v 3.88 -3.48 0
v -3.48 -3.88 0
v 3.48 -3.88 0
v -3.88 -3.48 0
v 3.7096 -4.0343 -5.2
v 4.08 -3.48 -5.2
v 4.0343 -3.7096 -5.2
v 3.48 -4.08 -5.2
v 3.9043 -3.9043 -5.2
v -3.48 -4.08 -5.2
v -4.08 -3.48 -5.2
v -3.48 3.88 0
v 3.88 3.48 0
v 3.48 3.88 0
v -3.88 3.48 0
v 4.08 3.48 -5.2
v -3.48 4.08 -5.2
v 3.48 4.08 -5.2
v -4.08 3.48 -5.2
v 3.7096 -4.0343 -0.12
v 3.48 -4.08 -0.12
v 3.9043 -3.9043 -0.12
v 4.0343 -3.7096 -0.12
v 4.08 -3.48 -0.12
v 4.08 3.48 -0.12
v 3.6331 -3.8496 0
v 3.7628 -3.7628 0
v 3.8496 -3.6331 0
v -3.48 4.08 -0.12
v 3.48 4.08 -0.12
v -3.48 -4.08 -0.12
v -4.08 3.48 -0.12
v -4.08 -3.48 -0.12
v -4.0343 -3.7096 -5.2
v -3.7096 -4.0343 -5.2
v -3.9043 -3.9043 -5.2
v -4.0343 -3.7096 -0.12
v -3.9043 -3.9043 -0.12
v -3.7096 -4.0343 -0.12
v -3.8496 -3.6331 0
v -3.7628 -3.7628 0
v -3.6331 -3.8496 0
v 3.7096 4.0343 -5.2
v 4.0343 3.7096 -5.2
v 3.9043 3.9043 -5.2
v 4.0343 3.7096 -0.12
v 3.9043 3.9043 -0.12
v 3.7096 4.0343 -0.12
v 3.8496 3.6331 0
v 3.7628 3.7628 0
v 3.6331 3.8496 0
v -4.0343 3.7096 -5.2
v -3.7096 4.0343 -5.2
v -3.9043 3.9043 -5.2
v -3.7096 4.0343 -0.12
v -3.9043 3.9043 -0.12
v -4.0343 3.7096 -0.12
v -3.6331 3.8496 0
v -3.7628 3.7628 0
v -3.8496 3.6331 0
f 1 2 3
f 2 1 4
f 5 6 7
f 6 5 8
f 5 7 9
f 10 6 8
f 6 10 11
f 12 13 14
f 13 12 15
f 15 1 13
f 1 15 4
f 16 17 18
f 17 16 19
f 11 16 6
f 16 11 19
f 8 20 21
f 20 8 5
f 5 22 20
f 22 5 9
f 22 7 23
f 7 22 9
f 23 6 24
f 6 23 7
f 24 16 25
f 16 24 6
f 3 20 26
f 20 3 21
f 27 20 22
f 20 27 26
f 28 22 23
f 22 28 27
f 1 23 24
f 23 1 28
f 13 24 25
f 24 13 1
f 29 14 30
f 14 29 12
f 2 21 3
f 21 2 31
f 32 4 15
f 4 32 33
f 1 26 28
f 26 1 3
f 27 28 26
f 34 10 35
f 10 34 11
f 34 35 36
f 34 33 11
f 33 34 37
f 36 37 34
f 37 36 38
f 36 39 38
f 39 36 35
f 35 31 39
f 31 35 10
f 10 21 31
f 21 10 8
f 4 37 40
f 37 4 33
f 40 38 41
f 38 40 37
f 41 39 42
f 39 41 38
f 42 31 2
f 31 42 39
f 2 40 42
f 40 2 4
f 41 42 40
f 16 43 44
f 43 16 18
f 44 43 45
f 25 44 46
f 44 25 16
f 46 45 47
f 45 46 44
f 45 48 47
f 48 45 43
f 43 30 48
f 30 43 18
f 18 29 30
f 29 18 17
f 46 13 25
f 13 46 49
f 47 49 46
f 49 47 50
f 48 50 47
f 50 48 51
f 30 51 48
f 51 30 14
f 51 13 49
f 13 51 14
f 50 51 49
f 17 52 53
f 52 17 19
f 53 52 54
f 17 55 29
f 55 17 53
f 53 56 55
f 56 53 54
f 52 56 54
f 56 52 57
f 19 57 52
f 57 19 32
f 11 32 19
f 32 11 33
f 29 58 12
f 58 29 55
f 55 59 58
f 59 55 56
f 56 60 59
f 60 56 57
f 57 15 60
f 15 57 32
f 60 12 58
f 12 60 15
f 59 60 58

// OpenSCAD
// file: ../p/1-4cyli.scad
use <../lib.scad>
function ldraw_lib__1_4cyli() = [
// 0 Cylinder 0.25
// 0 Name: 1-4cyli.dat
// 0 Author: James Jessiman
// 0 !LDRAW_ORG Primitive UPDATE 2012-01
// 0 !LICENSE Licensed under CC BY 2.0 and CC BY 4.0 : see CAreadme.txt
// 
// 0 BFC CERTIFY CCW
  [0,"BFC","CERTIFY"],
  [0,"BFC","CCW"],
// 
// 0 !HISTORY 2002-03-23 [sbliss] Added BFC statement.
// 0 !HISTORY 2002-04-25 [PTadmin] Official Update 2002-02
// 0 !HISTORY 2007-06-22 [PTadmin] Header formatted for Contributor Agreement
// 0 !HISTORY 2008-07-01 [PTadmin] Official Update 2008-01
// 0 !HISTORY 2012-02-16 [Philo] Changed to CCW
// 0 !HISTORY 2012-03-30 [PTadmin] Official Update 2012-01
// 
// 
// 4 16 1 1 0 0.9239 1 0.3827 0.9239 0 0.3827 1 0 0
  [4,16,1,1,0,0.9239,1,0.3827,0.9239,0,0.3827,1,0,0],
// 5 24 1 0 0 1 1 0 0.9239 0 0.3827 1 0 -1
  [5,24,1,0,0,1,1,0,0.9239,0,0.3827,1,0,-1],
// 4 16 0.9239 1 0.3827 0.7071 1 0.7071 0.7071 0 0.7071 0.9239 0 0.3827
  [4,16,0.9239,1,0.3827,0.7071,1,0.7071,0.7071,0,0.7071,0.9239,0,0.3827],
// 5 24 0.9239 0 0.3827 0.9239 1 0.3827 0.7071 0 0.7071 1 0 0
  [5,24,0.9239,0,0.3827,0.9239,1,0.3827,0.7071,0,0.7071,1,0,0],
// 4 16 0.7071 1 0.7071 0.3827 1 0.9239 0.3827 0 0.9239 0.7071 0 0.7071
  [4,16,0.7071,1,0.7071,0.3827,1,0.9239,0.3827,0,0.9239,0.7071,0,0.7071],
// 5 24 0.7071 0 0.7071 0.7071 1 0.7071 0.3827 0 0.9239 0.9239 0 0.3827
  [5,24,0.7071,0,0.7071,0.7071,1,0.7071,0.3827,0,0.9239,0.9239,0,0.3827],
// 4 16 0.3827 1 0.9239 0 1 1 0 0 1 0.3827 0 0.9239
  [4,16,0.3827,1,0.9239,0,1,1,0,0,1,0.3827,0,0.9239],
// 5 24 0.3827 0 0.9239 0.3827 1 0.9239 0 0 1 0.7071 0 0.7071
  [5,24,0.3827,0,0.9239,0.3827,1,0.9239,0,0,1,0.7071,0,0.7071],
// 5 24 0 0 1 0 1 1 0.3827 0 0.9239 -1 0 1
  [5,24,0,0,1,0,1,1,0.3827,0,0.9239,-1,0,1],
];
module ldraw_lib__1_4cyli(step=0, col=false, unit=2/5, alt=false, line=0.2, solid=!$preview)
    makepoly(ldraw_lib__1_4cyli(), step=step, col=col, unit=unit, alt=alt, line=line, solid=solid);
ldraw_lib__1_4cyli(line=0.2);
// file: ../p/rect2p.scad
use <../lib.scad>
function ldraw_lib__rect2p() = [
// 0 Rectangle with 2 Parallel Edges
// 0 Name: rect2p.dat
// 0 Author: Donald Sutter [technog]
// 0 !LDRAW_ORG Primitive UPDATE 2010-01
// 0 !LICENSE Licensed under CC BY 2.0 and CC BY 4.0 : see CAreadme.txt
// 
// 0 BFC CERTIFY CCW
  [0,"BFC","CERTIFY"],
  [0,"BFC","CCW"],
// 
// 0 !HISTORY 2003-08-01 [PTadmin] Official Update 2003-02
// 0 !HISTORY 2007-06-24 [PTadmin] Header formatted for Contributor Agreement
// 0 !HISTORY 2008-07-01 [PTadmin] Official Update 2008-01
// 0 !HISTORY 2010-01-17 [mikeheide] changed winding to CCW
// 0 !HISTORY 2010-04-05 [PTadmin] Official Update 2010-01
// 
// 
// 2 24 1 0 1 -1 0 1
  [2,24,1,0,1,-1,0,1],
// 2 24 -1 0 -1 1 0 -1
  [2,24,-1,0,-1,1,0,-1],
// 4 16 -1 0 1 -1 0 -1 1 0 -1 1 0 1
  [4,16,-1,0,1,-1,0,-1,1,0,-1,1,0,1],
// 0
];
module ldraw_lib__rect2p(step=0, col=false, unit=2/5, alt=false, line=0.2, solid=!$preview)
    makepoly(ldraw_lib__rect2p(), step=step, col=col, unit=unit, alt=alt, line=line, solid=solid);
ldraw_lib__rect2p(line=0.2);
// file: ../p/rect1.scad
use <../lib.scad>
function ldraw_lib__rect1() = [
// 0 Rectangle with 1 Edge
// 0 Name: rect1.dat
// 0 Author: Chris Dee [cwdee]
// 0 !LDRAW_ORG Primitive UPDATE 2010-01
// 0 !LICENSE Licensed under CC BY 2.0 and CC BY 4.0 : see CAreadme.txt
// 
// 0 BFC CERTIFY CCW
  [0,"BFC","CERTIFY"],
  [0,"BFC","CCW"],
// 
// 0 !HISTORY 2003-12-19 [PTadmin] Official Update 2003-03
// 0 !HISTORY 2007-06-24 [PTadmin] Header formatted for Contributor Agreement
// 0 !HISTORY 2008-07-01 [PTadmin] Official Update 2008-01
// 0 !HISTORY 2010-01-17 [mikeheide] changed winding to CCW
// 0 !HISTORY 2010-04-05 [PTadmin] Official Update 2010-01
// 
// 
// 2 24 1 0 -1 1 0 1
  [2,24,1,0,-1,1,0,1],
// 4 16 -1 0 1 -1 0 -1 1 0 -1 1 0 1
  [4,16,-1,0,1,-1,0,-1,1,0,-1,1,0,1],
// 0
];
module ldraw_lib__rect1(step=0, col=false, unit=2/5, alt=false, line=0.2, solid=!$preview)
    makepoly(ldraw_lib__rect1(), step=step, col=col, unit=unit, alt=alt, line=line, solid=solid);
ldraw_lib__rect1(line=0.2);
// file: ../p/1-4edge.scad
use <../lib.scad>
function ldraw_lib__1_4edge() = [
// 0 Circle 0.25
// 0 Name: 1-4edge.dat
// 0 Author: James Jessiman
// 0 !LDRAW_ORG Primitive UPDATE 2017-01
// 0 !LICENSE Licensed under CC BY 2.0 and CC BY 4.0 : see CAreadme.txt
// 
// 0 BFC CERTIFY CCW
  [0,"BFC","CERTIFY"],
  [0,"BFC","CCW"],
// 
// 0 !HISTORY 2007-06-22 [PTadmin] Header formatted for Contributor Agreement
// 0 !HISTORY 2008-07-01 [PTadmin] Official Update 2008-01
// 0 !HISTORY 2017-01-15 [Steffen] BFCed
// 0 !HISTORY 2017-12-30 [PTadmin] Official Update 2017-01
// 
// 
// 2 24 1 0 0 0.9239 0 0.3827
  [2,24,1,0,0,0.9239,0,0.3827],
// 2 24 0.9239 0 0.3827 0.7071 0 0.7071
  [2,24,0.9239,0,0.3827,0.7071,0,0.7071],
// 2 24 0.7071 0 0.7071 0.3827 0 0.9239
  [2,24,0.7071,0,0.7071,0.3827,0,0.9239],
// 2 24 0.3827 0 0.9239 0 0 1
  [2,24,0.3827,0,0.9239,0,0,1],
];
module ldraw_lib__1_4edge(step=0, col=false, unit=2/5, alt=false, line=0.2, solid=!$preview)
    makepoly(ldraw_lib__1_4edge(), step=step, col=col, unit=unit, alt=alt, line=line, solid=solid);
ldraw_lib__1_4edge(line=0.2);
// file: ../p/1-4cylo.scad
use <../lib.scad>
use <1-4cyli.scad>
use <1-4edge.scad>
function ldraw_lib__1_4cylo() = [
// 0 Cylinder Open 0.25
// 0 Name: 1-4cylo.dat
// 0 Author: Max Martin Richter [MMR1988]
// 0 !LDRAW_ORG Primitive UPDATE 2010-03
// 0 !LICENSE Licensed under CC BY 2.0 and CC BY 4.0 : see CAreadme.txt
// 
// 0 BFC CERTIFY CCW
  [0,"BFC","CERTIFY"],
  [0,"BFC","CCW"],
// 
// 0 !HISTORY 2010-12-31 [PTadmin] Official Update 2010-03
// 
// 
// 1 16 0 0 0 1 0 0 0 1 0 0 0 1 1-4edge.dat
  [1,16,0,0,0,1,0,0,0,1,0,0,0,1, ldraw_lib__1_4edge()],
// 1 16 0 1 0 1 0 0 0 1 0 0 0 1 1-4edge.dat
  [1,16,0,1,0,1,0,0,0,1,0,0,0,1, ldraw_lib__1_4edge()],
// 1 16 0 0 0 1 0 0 0 1 0 0 0 1 1-4cyli.dat
  [1,16,0,0,0,1,0,0,0,1,0,0,0,1, ldraw_lib__1_4cyli()],
];
module ldraw_lib__1_4cylo(step=0, col=false, unit=2/5, alt=false, line=0.2, solid=!$preview)
    makepoly(ldraw_lib__1_4cylo(), step=step, col=col, unit=unit, alt=alt, line=line, solid=solid);
ldraw_lib__1_4cylo(line=0.2);
// file: ../p/1-4con2.scad
use <../lib.scad>
function ldraw_lib__1_4con2() = [
// 0 Cone  2 x 0.25
// 0 Name: 1-4con2.dat
// 0 Author: Steve Bliss [sbliss]
// 0 !LDRAW_ORG Primitive UPDATE 2012-01
// 0 !LICENSE Licensed under CC BY 2.0 and CC BY 4.0 : see CAreadme.txt
// 
// 0 BFC CERTIFY CCW
  [0,"BFC","CERTIFY"],
  [0,"BFC","CCW"],
// 
// 0 !HISTORY 1999-07-05 [PTadmin] Official Update 1999-05
// 0 !HISTORY 2002-12-11 [cwdee] Standardised title and made BFC compliant
// 0 !HISTORY 2003-06-28 [pneaster] Added missing conditional line
// 0 !HISTORY 2003-12-19 [PTadmin] Official Update 2003-03
// 0 !HISTORY 2007-06-22 [PTadmin] Header formatted for Contributor Agreement
// 0 !HISTORY 2008-07-01 [PTadmin] Official Update 2008-01
// 0 !HISTORY 2012-02-16 [Philo] Recreated CCW
// 0 !HISTORY 2012-03-30 [PTadmin] Official Update 2012-01
// 
// 
// 4 16 2 1 0 1.8478 1 0.7654 2.7717 0 1.1481 3 0 0
  [4,16,2,1,0,1.8478,1,0.7654,2.7717,0,1.1481,3,0,0],
// 4 16 1.8478 1 0.7654 1.4142 1 1.4142 2.1213 0 2.1213 2.7717 0 1.1481
  [4,16,1.8478,1,0.7654,1.4142,1,1.4142,2.1213,0,2.1213,2.7717,0,1.1481],
// 4 16 1.4142 1 1.4142 0.7654 1 1.8478 1.1481 0 2.7717 2.1213 0 2.1213
  [4,16,1.4142,1,1.4142,0.7654,1,1.8478,1.1481,0,2.7717,2.1213,0,2.1213],
// 4 16 0.7654 1 1.8478 0 1 2 0 0 3 1.1481 0 2.7717
  [4,16,0.7654,1,1.8478,0,1,2,0,0,3,1.1481,0,2.7717],
// 0 // conditional lines
// 5 24 2 1 0 3 0 0 2 1 -0.8284 1.8478 1 0.7654
  [5,24,2,1,0,3,0,0,2,1,-0.8284,1.8478,1,0.7654],
// 5 24 1.8478 1 0.7654 2.7717 0 1.1481 2 1 0 1.4142 1 1.4142
  [5,24,1.8478,1,0.7654,2.7717,0,1.1481,2,1,0,1.4142,1,1.4142],
// 5 24 1.4142 1 1.4142 2.1213 0 2.1213 1.8478 1 0.7654 0.7654 1 1.8478
  [5,24,1.4142,1,1.4142,2.1213,0,2.1213,1.8478,1,0.7654,0.7654,1,1.8478],
// 5 24 0.7654 1 1.8478 1.1481 0 2.7717 1.4142 1 1.4142 0 1 2
  [5,24,0.7654,1,1.8478,1.1481,0,2.7717,1.4142,1,1.4142,0,1,2],
// 5 24 0 1 2 0 0 3 0.7654 1 1.8478 -0.8284 1 2
  [5,24,0,1,2,0,0,3,0.7654,1,1.8478,-0.8284,1,2],
// 0 // Build by Primitive Generator 2
];
module ldraw_lib__1_4con2(step=0, col=false, unit=2/5, alt=false, line=0.2, solid=!$preview)
    makepoly(ldraw_lib__1_4con2(), step=step, col=col, unit=unit, alt=alt, line=line, solid=solid);
ldraw_lib__1_4con2(line=0.2);
// file: ../p/1-4chrd.scad
use <../lib.scad>
function ldraw_lib__1_4chrd() = [
// 0 Chord 0.25
// 0 Name: 1-4chrd.dat
// 0 Author: Tony Hafner [hafhead]
// 0 !LDRAW_ORG Primitive UPDATE 2012-02
// 0 !LICENSE Licensed under CC BY 2.0 and CC BY 4.0 : see CAreadme.txt
// 
// 0 BFC CERTIFY CCW
  [0,"BFC","CERTIFY"],
  [0,"BFC","CCW"],
// 
// 0 !HISTORY 2004-04-22 [PTadmin] Official Update 2004-02
// 0 !HISTORY 2007-10-09 [PTadmin] Header formatted for Contributor Agreement
// 0 !HISTORY 2008-07-01 [PTadmin] Official Update 2008-01
// 0 !HISTORY 2012-08-02 [MMR1988] Re-creation with PrimGen2 and Rectifier
// 0 !HISTORY 2012-08-09 [PTadmin] Official Update 2012-02
// 
// 
// 4 16 0.9239 0 0.3827 0.3827 0 0.9239 0 0 1 1 0 0
  [4,16,0.9239,0,0.3827,0.3827,0,0.9239,0,0,1,1,0,0],
// 3 16 0.7071 0 0.7071 0.3827 0 0.9239 0.9239 0 0.3827
  [3,16,0.7071,0,0.7071,0.3827,0,0.9239,0.9239,0,0.3827],
];
module ldraw_lib__1_4chrd(step=0, col=false, unit=2/5, alt=false, line=0.2, solid=!$preview)
    makepoly(ldraw_lib__1_4chrd(), step=step, col=col, unit=unit, alt=alt, line=line, solid=solid);
ldraw_lib__1_4chrd(line=0.2);
// main file
use <../lib.scad>
use <../p/1-4chrd.scad>
use <../p/1-4con2.scad>
use <../p/1-4cylo.scad>
use <../p/1-4edge.scad>
use <../p/rect1.scad>
use <../p/rect2p.scad>
function ldraw_lib__99146() = [
// 0 ~Electric Mindstorms EV3 Square Button
// 0 Name: 99146.dat
// 0 Author: Philippe Hurbain [Philo]
// 0 !LDRAW_ORG Part UPDATE 2013-02
// 0 !LICENSE Licensed under CC BY 2.0 and CC BY 4.0 : see CAreadme.txt
// 
// 0 BFC CERTIFY CCW
  [0,"BFC","CERTIFY"],
  [0,"BFC","CCW"],
// 
// 0 !HISTORY 2012-05-20 {LEGO MINDSTORMS Team} Original part shape
// 0 !HISTORY 2012-06-09 [Philo] Complete rebuild for LDraw Parts Tracker
// 0 !HISTORY 2013-12-23 [PTadmin] Official Update 2013-02
// 
// 
// 4 16 8.7 0 -9.7 9.7 0 -8.7 -9.7 0 -8.7 -8.7 0 -9.7
  [4,16,8.7,0,-9.7,9.7,0,-8.7,-9.7,0,-8.7,-8.7,0,-9.7],
// 1 16 8.7 13 -8.7 0 0 1.5 0 -0.3 0 -1.5 0 0 1-4chrd.dat
  [1,16,8.7,13,-8.7,0,0,1.5,0,-0.3,0,-1.5,0,0, ldraw_lib__1_4chrd()],
// 4 16 -8.7 13 -10.2 -10.2 13 -8.7 10.2 13 -8.7 8.7 13 -10.2
  [4,16,-8.7,13,-10.2,-10.2,13,-8.7,10.2,13,-8.7,8.7,13,-10.2],
// 4 16 -8.7 0 9.7 -9.7 0 8.7 9.7 0 8.7 8.7 0 9.7
  [4,16,-8.7,0,9.7,-9.7,0,8.7,9.7,0,8.7,8.7,0,9.7],
// 1 16 0 0 0 0 0 -9.7 0 1 0 8.7 0 0 rect2p.dat
  [1,16,0,0,0,0,0,-9.7,0,1,0,8.7,0,0, ldraw_lib__rect2p()],
// 4 16 8.7 13 10.2 10.2 13 8.7 -10.2 13 8.7 -8.7 13 10.2
  [4,16,8.7,13,10.2,10.2,13,8.7,-10.2,13,8.7,-8.7,13,10.2],
// 4 16 -10.2 13 -8.7 -10.2 13 8.7 10.2 13 8.7 10.2 13 -8.7
  [4,16,-10.2,13,-8.7,-10.2,13,8.7,10.2,13,8.7,10.2,13,-8.7],
// 1 16 8.7 0.3 -8.7 0 0 1.5 0 12.7 0 -1.5 0 0 1-4cylo.dat
  [1,16,8.7,0.3,-8.7,0,0,1.5,0,12.7,0,-1.5,0,0, ldraw_lib__1_4cylo()],
// 1 16 10.2 6.65 0 0 -1 0 0 0 -6.35 8.7 0 0 rect2p.dat
  [1,16,10.2,6.65,0,0,-1,0,0,0,-6.35,8.7,0,0, ldraw_lib__rect2p()],
// 1 16 8.7 0.3 -8.7 0 0 0.5 0 -0.3 0 -0.5 0 0 1-4con2.dat
  [1,16,8.7,0.3,-8.7,0,0,0.5,0,-0.3,0,-0.5,0,0, ldraw_lib__1_4con2()],
// 1 16 8.7 0 -8.7 0 0 1 0 0.3 0 -1 0 0 1-4edge.dat
  [1,16,8.7,0,-8.7,0,0,1,0,0.3,0,-1,0,0, ldraw_lib__1_4edge()],
// 4 16 9.7 0 -8.7 10.2 0.3 -8.7 10.2 0.3 8.7 9.7 0 8.7
  [4,16,9.7,0,-8.7,10.2,0.3,-8.7,10.2,0.3,8.7,9.7,0,8.7],
// 1 16 0 0.15 9.95 0 0 8.7 -0.15 8.7 0 -0.25 -5.22 0 rect1.dat
  [1,16,0,0.15,9.95,0,0,8.7,-0.15,8.7,0,-0.25,-5.22,0, ldraw_lib__rect1()],
// 1 16 0 0.15 -9.95 0 0 -8.7 -0.15 8.7 0 0.25 5.22 0 rect1.dat
  [1,16,0,0.15,-9.95,0,0,-8.7,-0.15,8.7,0,0.25,5.22,0, ldraw_lib__rect1()],
// 4 16 -9.7 0 8.7 -10.2 0.3 8.7 -10.2 0.3 -8.7 -9.7 0 -8.7
  [4,16,-9.7,0,8.7,-10.2,0.3,8.7,-10.2,0.3,-8.7,-9.7,0,-8.7],
// 1 16 8.7 0 -8.7 0 0 1 0 0.3 0 -1 0 0 1-4chrd.dat
  [1,16,8.7,0,-8.7,0,0,1,0,0.3,0,-1,0,0, ldraw_lib__1_4chrd()],
// 1 16 -8.7 13 -8.7 -1.5 0 0 0 -0.3 0 0 0 -1.5 1-4chrd.dat
  [1,16,-8.7,13,-8.7,-1.5,0,0,0,-0.3,0,0,0,-1.5, ldraw_lib__1_4chrd()],
// 1 16 -8.7 0.3 -8.7 -1.5 0 0 0 12.7 0 0 0 -1.5 1-4cylo.dat
  [1,16,-8.7,0.3,-8.7,-1.5,0,0,0,12.7,0,0,0,-1.5, ldraw_lib__1_4cylo()],
// 1 16 0 6.65 -10.2 8.7 0 0 0 0 -6.35 0 1 0 rect2p.dat
  [1,16,0,6.65,-10.2,8.7,0,0,0,0,-6.35,0,1,0, ldraw_lib__rect2p()],
// 1 16 -8.7 0.3 -8.7 -0.5 0 0 0 -0.3 0 0 0 -0.5 1-4con2.dat
  [1,16,-8.7,0.3,-8.7,-0.5,0,0,0,-0.3,0,0,0,-0.5, ldraw_lib__1_4con2()],
// 1 16 -8.7 0 -8.7 -1 0 0 0 0.3 0 0 0 -1 1-4edge.dat
  [1,16,-8.7,0,-8.7,-1,0,0,0,0.3,0,0,0,-1, ldraw_lib__1_4edge()],
// 1 16 -8.7 0 -8.7 -1 0 0 0 0.3 0 0 0 -1 1-4chrd.dat
  [1,16,-8.7,0,-8.7,-1,0,0,0,0.3,0,0,0,-1, ldraw_lib__1_4chrd()],
// 1 16 8.7 13 8.7 1.5 0 0 0 -0.3 0 0 0 1.5 1-4chrd.dat
  [1,16,8.7,13,8.7,1.5,0,0,0,-0.3,0,0,0,1.5, ldraw_lib__1_4chrd()],
// 1 16 8.7 0.3 8.7 1.5 0 0 0 12.7 0 0 0 1.5 1-4cylo.dat
  [1,16,8.7,0.3,8.7,1.5,0,0,0,12.7,0,0,0,1.5, ldraw_lib__1_4cylo()],
// 1 16 0 6.65 10.2 -8.7 0 0 0 0 -6.35 0 -1 0 rect2p.dat
  [1,16,0,6.65,10.2,-8.7,0,0,0,0,-6.35,0,-1,0, ldraw_lib__rect2p()],
// 1 16 8.7 0.3 8.7 0.5 0 0 0 -0.3 0 0 0 0.5 1-4con2.dat
  [1,16,8.7,0.3,8.7,0.5,0,0,0,-0.3,0,0,0,0.5, ldraw_lib__1_4con2()],
// 1 16 8.7 0 8.7 1 0 0 0 0.3 0 0 0 1 1-4edge.dat
  [1,16,8.7,0,8.7,1,0,0,0,0.3,0,0,0,1, ldraw_lib__1_4edge()],
// 1 16 8.7 0 8.7 1 0 0 0 0.3 0 0 0 1 1-4chrd.dat
  [1,16,8.7,0,8.7,1,0,0,0,0.3,0,0,0,1, ldraw_lib__1_4chrd()],
// 1 16 -8.7 13 8.7 0 0 -1.5 0 -0.3 0 1.5 0 0 1-4chrd.dat
  [1,16,-8.7,13,8.7,0,0,-1.5,0,-0.3,0,1.5,0,0, ldraw_lib__1_4chrd()],
// 1 16 -8.7 0.3 8.7 0 0 -1.5 0 12.7 0 1.5 0 0 1-4cylo.dat
  [1,16,-8.7,0.3,8.7,0,0,-1.5,0,12.7,0,1.5,0,0, ldraw_lib__1_4cylo()],
// 1 16 -10.2 6.65 0 0 1 0 0 0 -6.35 -8.7 0 0 rect2p.dat
  [1,16,-10.2,6.65,0,0,1,0,0,0,-6.35,-8.7,0,0, ldraw_lib__rect2p()],
// 1 16 -8.7 0.3 8.7 0 0 -0.5 0 -0.3 0 0.5 0 0 1-4con2.dat
  [1,16,-8.7,0.3,8.7,0,0,-0.5,0,-0.3,0,0.5,0,0, ldraw_lib__1_4con2()],
// 1 16 -8.7 0 8.7 0 0 -1 0 0.3 0 1 0 0 1-4edge.dat
  [1,16,-8.7,0,8.7,0,0,-1,0,0.3,0,1,0,0, ldraw_lib__1_4edge()],
// 1 16 -8.7 0 8.7 0 0 -1 0 0.3 0 1 0 0 1-4chrd.dat
  [1,16,-8.7,0,8.7,0,0,-1,0,0.3,0,1,0,0, ldraw_lib__1_4chrd()],
];
module ldraw_lib__99146(step=0, col=false, unit=2/5, alt=false, line=0.2, solid=!$preview)
    makepoly(ldraw_lib__99146(), step=step, col=col, unit=unit, alt=alt, line=line, solid=solid);
ldraw_lib__99146(line=0.2);
